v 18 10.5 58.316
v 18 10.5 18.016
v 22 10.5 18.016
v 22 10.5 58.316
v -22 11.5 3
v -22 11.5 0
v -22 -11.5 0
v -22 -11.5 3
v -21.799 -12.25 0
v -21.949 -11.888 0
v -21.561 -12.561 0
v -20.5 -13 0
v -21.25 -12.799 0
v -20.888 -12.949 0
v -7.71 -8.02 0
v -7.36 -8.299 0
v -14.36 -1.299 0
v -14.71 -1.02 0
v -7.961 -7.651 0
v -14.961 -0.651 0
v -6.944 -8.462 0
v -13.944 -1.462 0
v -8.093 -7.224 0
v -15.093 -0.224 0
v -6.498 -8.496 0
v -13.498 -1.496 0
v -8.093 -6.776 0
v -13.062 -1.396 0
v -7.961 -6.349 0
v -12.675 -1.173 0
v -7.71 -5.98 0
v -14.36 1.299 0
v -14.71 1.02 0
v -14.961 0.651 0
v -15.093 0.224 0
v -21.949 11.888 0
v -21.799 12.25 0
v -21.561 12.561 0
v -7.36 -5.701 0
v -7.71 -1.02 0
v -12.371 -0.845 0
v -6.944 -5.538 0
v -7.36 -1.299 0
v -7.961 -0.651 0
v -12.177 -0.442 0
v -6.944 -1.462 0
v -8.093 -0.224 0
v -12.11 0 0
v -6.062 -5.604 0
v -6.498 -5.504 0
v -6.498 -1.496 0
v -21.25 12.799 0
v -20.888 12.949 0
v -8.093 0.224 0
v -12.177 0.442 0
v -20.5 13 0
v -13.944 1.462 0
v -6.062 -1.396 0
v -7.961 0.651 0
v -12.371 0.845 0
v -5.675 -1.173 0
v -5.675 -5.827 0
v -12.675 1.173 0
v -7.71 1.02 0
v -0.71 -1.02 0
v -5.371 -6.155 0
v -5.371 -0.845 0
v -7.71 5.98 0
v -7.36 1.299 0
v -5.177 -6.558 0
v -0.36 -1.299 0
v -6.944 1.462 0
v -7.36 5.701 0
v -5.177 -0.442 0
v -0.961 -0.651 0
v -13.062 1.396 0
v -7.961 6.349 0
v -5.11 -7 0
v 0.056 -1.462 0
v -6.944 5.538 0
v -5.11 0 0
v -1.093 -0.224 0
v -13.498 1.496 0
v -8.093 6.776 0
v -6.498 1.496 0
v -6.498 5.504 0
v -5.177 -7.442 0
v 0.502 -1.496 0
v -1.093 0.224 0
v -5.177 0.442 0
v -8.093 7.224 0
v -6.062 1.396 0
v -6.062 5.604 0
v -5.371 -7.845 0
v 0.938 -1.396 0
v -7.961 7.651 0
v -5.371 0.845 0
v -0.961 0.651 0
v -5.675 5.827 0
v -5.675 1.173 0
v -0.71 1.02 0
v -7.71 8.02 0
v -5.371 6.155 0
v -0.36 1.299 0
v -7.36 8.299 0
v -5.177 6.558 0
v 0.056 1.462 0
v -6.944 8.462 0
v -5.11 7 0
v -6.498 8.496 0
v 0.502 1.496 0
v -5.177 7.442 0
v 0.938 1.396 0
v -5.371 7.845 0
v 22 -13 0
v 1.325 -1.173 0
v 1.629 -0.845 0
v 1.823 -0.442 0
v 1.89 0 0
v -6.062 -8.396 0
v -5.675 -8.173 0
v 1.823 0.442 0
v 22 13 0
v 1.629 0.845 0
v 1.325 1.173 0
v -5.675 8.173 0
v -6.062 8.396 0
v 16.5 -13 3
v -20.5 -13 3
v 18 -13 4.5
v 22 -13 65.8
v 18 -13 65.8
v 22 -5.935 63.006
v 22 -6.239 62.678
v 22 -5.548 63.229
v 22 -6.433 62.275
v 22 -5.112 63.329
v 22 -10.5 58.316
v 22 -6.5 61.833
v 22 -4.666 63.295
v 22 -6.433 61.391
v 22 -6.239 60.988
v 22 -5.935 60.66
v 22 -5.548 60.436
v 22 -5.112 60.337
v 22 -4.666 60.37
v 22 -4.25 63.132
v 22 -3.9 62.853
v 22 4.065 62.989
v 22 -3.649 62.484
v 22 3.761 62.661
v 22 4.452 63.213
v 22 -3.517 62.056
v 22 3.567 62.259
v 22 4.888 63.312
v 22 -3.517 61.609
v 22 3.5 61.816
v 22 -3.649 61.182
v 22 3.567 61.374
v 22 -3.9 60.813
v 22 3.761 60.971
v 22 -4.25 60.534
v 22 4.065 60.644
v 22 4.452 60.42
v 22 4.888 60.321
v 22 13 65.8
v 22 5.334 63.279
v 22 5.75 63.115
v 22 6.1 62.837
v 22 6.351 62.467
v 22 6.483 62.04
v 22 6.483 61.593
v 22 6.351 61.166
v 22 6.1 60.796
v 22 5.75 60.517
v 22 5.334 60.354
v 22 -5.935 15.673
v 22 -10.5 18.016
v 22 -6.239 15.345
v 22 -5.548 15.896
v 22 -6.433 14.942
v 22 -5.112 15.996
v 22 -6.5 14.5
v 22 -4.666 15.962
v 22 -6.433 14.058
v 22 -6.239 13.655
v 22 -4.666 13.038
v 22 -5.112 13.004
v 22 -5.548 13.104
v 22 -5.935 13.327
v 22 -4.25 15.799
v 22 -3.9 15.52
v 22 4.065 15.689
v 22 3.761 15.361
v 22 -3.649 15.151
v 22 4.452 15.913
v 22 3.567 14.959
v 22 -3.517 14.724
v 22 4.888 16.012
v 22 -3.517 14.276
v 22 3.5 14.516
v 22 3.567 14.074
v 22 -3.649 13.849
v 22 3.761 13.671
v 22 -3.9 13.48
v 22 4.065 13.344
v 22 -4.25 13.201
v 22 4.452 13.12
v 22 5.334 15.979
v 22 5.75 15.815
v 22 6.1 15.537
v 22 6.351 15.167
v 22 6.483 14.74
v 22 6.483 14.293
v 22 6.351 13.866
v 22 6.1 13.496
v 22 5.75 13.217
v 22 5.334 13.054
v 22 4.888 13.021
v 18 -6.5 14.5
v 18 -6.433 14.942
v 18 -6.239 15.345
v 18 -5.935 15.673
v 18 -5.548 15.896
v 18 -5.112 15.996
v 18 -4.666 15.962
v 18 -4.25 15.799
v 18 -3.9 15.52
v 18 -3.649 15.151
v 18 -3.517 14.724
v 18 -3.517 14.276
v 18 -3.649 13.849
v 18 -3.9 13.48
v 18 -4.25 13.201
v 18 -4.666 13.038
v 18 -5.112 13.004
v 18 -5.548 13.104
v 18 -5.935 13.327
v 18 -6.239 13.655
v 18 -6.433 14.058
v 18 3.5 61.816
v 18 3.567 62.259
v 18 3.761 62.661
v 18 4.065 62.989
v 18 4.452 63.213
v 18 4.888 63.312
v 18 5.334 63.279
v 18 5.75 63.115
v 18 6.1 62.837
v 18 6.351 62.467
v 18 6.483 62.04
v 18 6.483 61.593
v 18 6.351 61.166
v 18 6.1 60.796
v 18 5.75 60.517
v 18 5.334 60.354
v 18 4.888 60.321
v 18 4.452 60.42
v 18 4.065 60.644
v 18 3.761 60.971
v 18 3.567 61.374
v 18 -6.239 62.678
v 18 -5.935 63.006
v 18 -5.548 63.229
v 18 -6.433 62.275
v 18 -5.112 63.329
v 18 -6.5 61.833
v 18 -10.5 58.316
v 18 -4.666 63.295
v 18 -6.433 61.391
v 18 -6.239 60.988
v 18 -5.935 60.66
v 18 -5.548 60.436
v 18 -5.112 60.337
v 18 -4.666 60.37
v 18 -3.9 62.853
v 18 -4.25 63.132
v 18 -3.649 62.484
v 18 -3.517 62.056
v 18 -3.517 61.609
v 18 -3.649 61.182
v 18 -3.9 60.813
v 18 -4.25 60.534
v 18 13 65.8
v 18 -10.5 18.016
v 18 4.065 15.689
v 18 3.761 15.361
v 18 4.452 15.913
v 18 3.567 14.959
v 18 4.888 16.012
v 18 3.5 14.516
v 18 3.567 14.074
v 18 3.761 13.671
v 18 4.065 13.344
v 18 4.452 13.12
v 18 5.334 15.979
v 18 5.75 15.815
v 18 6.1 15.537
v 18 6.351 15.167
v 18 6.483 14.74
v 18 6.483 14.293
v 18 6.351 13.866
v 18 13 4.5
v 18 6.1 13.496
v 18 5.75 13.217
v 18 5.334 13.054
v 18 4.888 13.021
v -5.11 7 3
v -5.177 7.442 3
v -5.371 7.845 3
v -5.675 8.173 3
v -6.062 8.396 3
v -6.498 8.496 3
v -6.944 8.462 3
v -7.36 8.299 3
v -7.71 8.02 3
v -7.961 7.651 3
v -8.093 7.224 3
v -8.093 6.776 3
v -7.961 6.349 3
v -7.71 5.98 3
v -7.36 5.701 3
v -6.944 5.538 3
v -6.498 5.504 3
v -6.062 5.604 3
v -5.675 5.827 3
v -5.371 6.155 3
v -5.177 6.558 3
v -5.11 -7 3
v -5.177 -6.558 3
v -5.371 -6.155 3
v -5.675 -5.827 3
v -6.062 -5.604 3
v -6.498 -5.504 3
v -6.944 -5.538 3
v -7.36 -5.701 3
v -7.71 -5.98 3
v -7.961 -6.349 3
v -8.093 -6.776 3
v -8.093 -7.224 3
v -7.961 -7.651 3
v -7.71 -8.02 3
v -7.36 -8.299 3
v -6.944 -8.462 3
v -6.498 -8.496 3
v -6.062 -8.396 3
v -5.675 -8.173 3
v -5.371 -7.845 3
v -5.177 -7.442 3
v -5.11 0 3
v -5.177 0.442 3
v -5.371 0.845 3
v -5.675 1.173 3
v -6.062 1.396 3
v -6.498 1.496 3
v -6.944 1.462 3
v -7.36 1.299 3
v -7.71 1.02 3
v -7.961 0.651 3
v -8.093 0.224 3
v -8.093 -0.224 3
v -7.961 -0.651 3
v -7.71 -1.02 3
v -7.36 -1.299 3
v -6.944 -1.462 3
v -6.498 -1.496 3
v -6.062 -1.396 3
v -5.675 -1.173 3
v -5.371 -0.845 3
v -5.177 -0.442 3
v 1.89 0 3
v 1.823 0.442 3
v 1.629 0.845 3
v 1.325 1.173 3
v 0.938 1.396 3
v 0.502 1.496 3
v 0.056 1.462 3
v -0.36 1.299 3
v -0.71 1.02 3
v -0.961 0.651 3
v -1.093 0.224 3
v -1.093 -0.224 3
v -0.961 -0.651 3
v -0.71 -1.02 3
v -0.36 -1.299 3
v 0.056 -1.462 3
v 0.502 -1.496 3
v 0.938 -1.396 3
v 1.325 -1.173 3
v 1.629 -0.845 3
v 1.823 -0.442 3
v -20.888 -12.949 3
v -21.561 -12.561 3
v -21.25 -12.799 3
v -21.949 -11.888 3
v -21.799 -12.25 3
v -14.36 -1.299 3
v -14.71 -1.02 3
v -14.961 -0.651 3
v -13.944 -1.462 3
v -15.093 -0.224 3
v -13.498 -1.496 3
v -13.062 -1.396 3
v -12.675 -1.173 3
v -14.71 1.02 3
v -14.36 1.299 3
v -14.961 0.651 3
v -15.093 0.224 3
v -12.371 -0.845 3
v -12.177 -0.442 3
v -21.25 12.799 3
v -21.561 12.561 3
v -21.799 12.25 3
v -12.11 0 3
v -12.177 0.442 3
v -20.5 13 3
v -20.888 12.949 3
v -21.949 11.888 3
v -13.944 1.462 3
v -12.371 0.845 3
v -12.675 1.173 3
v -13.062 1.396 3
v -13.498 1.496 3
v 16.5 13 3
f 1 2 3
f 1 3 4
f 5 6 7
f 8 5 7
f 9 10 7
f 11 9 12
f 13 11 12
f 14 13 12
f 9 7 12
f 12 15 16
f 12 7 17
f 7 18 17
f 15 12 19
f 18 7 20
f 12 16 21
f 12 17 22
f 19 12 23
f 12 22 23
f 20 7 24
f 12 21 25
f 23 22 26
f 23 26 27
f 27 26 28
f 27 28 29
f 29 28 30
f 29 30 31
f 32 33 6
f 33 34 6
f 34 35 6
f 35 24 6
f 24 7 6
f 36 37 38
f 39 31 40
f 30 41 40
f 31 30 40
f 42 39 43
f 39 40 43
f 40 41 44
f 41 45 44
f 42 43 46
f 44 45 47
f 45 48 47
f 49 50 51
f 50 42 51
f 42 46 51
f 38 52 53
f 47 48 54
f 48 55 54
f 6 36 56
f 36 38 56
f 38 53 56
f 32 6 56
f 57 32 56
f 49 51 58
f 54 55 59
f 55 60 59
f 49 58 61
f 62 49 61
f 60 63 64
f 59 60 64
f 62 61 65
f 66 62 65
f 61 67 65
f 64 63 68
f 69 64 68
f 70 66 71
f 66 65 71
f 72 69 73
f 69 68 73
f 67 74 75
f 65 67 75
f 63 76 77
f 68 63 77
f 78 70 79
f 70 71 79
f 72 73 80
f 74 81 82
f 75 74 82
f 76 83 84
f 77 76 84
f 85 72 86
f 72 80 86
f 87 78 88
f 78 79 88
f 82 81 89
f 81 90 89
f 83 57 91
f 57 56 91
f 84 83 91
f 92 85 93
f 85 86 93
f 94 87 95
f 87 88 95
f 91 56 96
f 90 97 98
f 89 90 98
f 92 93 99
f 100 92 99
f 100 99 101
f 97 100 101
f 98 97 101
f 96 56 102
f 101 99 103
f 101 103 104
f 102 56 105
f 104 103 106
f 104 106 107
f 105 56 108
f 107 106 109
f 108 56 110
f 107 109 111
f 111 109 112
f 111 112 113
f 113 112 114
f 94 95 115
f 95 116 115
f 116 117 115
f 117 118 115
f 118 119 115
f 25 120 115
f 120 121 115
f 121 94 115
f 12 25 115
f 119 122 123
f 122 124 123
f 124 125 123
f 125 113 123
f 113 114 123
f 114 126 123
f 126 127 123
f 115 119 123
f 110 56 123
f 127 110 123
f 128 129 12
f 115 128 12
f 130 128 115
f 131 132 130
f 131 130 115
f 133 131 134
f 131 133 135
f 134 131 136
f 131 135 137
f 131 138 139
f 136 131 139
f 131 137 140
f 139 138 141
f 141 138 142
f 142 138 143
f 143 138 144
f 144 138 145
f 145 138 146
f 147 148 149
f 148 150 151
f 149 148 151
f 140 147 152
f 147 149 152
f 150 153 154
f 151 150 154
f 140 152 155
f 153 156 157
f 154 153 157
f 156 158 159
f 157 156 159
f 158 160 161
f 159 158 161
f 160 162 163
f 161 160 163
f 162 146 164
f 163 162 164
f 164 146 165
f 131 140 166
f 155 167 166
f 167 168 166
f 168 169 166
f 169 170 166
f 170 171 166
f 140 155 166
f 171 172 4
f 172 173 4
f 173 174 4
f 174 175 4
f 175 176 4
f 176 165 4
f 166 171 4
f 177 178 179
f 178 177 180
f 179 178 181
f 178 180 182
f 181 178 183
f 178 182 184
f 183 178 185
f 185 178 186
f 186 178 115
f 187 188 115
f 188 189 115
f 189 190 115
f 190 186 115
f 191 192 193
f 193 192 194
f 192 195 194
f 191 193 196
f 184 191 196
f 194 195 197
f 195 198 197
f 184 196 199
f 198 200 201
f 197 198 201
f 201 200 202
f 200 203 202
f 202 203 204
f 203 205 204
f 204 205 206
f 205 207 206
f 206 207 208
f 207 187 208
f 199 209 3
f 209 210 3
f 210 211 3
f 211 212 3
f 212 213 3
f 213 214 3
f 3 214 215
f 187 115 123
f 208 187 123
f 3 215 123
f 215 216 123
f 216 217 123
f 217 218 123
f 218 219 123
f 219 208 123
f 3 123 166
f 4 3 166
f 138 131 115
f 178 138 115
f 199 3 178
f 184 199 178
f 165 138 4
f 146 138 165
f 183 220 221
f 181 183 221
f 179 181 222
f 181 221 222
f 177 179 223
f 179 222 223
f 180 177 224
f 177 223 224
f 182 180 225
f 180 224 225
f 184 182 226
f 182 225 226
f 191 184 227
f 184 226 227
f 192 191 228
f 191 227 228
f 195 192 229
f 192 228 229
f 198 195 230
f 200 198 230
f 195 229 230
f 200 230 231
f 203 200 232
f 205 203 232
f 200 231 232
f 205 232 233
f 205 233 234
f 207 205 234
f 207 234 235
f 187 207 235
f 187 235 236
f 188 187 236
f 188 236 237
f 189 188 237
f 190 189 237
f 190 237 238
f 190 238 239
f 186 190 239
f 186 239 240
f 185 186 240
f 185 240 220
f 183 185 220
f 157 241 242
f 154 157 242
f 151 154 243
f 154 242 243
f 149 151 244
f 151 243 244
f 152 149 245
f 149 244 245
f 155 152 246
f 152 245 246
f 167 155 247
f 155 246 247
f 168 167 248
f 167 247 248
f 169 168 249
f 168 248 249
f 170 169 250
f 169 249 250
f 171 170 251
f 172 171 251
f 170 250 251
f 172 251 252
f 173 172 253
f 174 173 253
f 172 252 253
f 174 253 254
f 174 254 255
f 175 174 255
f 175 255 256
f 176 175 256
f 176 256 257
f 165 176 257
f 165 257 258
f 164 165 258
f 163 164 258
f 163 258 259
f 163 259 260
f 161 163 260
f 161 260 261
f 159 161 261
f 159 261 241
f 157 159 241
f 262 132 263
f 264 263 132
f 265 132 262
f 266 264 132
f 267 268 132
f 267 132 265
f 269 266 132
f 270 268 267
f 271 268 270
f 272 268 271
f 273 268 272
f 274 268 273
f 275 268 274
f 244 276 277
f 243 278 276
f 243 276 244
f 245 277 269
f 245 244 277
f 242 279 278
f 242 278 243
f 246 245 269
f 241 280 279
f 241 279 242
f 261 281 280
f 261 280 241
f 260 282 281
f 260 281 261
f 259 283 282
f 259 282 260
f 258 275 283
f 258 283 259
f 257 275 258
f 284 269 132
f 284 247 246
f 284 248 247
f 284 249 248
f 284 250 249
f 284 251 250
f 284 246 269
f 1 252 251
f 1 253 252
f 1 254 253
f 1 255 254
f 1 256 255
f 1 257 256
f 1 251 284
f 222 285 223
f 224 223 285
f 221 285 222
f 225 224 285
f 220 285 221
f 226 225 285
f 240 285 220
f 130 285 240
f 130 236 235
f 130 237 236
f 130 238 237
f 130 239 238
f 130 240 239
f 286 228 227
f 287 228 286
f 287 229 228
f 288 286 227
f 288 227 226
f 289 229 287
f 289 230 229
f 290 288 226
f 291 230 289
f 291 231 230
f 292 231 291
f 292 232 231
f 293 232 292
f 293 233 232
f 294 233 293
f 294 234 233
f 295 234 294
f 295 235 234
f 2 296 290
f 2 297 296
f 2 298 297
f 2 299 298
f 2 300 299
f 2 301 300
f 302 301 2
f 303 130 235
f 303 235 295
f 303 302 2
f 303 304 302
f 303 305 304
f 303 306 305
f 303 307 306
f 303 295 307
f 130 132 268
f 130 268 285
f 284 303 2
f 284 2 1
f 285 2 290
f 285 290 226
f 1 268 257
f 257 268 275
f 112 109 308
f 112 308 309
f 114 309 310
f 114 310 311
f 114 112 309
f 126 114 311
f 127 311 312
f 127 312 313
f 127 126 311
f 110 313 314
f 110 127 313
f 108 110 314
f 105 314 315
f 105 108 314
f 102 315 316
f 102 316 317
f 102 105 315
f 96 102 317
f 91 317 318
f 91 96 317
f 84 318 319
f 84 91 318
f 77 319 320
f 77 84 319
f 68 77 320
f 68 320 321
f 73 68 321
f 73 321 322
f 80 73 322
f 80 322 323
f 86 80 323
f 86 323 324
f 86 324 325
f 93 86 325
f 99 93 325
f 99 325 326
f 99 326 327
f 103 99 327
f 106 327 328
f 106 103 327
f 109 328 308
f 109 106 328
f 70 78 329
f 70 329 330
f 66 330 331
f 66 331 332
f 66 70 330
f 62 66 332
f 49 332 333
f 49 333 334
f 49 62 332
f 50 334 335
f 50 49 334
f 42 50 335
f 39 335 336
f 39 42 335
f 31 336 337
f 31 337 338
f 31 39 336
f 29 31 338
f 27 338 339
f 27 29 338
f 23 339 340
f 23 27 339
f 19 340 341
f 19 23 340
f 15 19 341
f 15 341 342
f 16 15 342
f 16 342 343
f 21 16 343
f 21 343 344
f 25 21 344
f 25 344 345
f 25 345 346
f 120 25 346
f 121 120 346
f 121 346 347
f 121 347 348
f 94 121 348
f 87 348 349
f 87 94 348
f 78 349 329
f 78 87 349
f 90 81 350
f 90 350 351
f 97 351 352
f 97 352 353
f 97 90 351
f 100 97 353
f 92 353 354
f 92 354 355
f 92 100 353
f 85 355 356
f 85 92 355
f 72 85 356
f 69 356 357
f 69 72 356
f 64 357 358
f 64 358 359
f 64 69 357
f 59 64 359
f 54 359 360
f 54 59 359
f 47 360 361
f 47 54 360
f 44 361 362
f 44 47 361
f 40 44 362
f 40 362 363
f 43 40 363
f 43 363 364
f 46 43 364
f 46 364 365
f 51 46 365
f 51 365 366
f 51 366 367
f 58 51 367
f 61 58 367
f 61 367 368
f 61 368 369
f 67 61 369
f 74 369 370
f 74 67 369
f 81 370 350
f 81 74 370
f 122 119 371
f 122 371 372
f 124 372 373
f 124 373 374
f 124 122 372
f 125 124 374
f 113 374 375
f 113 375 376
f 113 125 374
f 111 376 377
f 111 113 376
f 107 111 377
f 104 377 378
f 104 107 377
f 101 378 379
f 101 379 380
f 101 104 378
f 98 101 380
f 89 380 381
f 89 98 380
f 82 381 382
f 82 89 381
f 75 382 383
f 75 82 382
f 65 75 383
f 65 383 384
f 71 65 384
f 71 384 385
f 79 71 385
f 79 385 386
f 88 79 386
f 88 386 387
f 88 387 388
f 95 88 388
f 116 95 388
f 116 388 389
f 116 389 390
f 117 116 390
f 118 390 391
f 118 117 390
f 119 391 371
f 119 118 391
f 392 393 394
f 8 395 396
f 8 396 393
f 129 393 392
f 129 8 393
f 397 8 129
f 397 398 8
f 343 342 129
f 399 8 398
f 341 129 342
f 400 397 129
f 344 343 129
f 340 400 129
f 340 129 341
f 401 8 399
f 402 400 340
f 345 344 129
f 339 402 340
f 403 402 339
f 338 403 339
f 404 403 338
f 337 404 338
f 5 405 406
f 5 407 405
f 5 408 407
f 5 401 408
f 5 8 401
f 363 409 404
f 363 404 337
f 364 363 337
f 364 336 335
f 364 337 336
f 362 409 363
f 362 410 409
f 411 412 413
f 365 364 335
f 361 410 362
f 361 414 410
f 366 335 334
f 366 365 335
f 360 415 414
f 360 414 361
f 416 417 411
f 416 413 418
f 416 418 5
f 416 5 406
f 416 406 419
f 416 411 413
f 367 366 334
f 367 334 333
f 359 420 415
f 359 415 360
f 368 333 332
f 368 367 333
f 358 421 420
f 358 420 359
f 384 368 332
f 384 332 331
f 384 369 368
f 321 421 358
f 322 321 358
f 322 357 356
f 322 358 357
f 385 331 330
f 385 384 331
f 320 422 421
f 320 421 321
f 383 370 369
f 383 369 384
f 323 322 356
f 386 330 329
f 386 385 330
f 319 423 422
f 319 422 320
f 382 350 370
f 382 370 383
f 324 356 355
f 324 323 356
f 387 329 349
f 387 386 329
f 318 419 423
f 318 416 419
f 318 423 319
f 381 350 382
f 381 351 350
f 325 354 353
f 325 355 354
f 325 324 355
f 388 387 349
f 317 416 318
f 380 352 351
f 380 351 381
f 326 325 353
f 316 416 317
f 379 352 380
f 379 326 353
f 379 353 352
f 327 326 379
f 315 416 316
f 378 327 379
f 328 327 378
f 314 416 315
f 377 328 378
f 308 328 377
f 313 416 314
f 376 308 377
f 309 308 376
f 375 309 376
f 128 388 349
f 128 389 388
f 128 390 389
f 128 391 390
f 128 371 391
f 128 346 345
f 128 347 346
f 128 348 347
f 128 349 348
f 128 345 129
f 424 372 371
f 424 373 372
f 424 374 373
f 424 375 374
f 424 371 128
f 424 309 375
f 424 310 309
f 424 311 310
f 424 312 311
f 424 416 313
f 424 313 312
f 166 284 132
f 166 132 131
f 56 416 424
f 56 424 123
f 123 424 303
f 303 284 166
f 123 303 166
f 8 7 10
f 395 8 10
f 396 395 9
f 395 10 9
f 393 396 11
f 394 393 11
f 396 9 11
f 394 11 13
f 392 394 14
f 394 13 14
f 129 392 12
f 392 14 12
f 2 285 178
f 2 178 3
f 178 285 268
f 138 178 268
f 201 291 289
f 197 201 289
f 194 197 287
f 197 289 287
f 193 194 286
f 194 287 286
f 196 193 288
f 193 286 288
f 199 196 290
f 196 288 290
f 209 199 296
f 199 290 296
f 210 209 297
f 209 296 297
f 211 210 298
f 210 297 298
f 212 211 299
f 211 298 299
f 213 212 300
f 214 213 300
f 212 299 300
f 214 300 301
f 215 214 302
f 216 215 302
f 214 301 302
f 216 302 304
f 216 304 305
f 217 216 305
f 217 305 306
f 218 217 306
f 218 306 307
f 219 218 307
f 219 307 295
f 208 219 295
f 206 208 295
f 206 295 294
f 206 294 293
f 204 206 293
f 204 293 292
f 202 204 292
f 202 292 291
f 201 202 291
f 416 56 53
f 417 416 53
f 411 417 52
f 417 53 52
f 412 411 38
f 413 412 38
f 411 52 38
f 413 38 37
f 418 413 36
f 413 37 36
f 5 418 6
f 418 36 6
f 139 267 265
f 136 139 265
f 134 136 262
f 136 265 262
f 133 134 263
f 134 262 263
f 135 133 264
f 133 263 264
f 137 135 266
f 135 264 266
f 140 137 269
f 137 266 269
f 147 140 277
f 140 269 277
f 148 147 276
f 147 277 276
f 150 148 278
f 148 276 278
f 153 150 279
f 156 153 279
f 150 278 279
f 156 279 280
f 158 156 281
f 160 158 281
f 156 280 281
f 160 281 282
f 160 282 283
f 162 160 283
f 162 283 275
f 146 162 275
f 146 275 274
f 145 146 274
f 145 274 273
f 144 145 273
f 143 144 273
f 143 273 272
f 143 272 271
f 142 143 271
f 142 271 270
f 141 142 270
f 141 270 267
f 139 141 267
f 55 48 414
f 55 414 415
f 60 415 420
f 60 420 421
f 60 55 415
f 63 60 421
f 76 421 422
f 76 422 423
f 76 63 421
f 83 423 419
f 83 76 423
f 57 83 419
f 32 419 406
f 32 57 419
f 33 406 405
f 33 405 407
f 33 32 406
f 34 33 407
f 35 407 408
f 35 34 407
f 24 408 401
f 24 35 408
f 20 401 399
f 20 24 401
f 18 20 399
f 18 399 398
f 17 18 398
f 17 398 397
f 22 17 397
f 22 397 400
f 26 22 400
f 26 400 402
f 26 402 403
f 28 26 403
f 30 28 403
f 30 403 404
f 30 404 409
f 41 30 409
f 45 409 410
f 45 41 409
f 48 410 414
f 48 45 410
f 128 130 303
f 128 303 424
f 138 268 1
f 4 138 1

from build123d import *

# Parameters (mm, degrees)
CROQUIS1_R              = 1.5
SALIENTE_EXTRUIR1_DEPTH = 3
CROQUIS2_W              = 4
CROQUIS2_H              = 26
SALIENTE_EXTRUIR2_DEPTH = 62.8
SALIENTE_EXTRUIR3_DEPTH = 26
CROQUIS5_W              = 40.3
CROQUIS5_H              = 21
CROQUIS5_R              = 1.5
CORTAR_EXTRUIR1_DEPTH   = 26


with BuildPart() as part:
    # Croquis1 → Saliente-Extruir1 (new body)
    with BuildSketch(Plane.XY):
        with BuildLine():
            Line((-20.5, -13), (22, -13))
            Line((22, -13), (22, 13))
            Line((22, 13), (-20.5, 13))
            ThreePointArc((-20.5, 13), (-21.560660172, 12.560660172), (-22, 11.5))
            Line((-22, 11.5), (-22, -11.5))
            ThreePointArc((-22, -11.5), (-21.560660172, -12.560660172), (-20.5, -13))
        make_face()
        with Locations((-6.61, 0)):
            Circle(CROQUIS1_R, mode=Mode.SUBTRACT)
        with Locations((-13.61, 0)):
            Circle(CROQUIS1_R, mode=Mode.SUBTRACT)
        with Locations((-6.61, 7)):
            Circle(CROQUIS1_R, mode=Mode.SUBTRACT)
        with Locations((0.39, 0)):
            Circle(CROQUIS1_R, mode=Mode.SUBTRACT)
        with Locations((-6.61, -7)):
            Circle(CROQUIS1_R, mode=Mode.SUBTRACT)
    extrude(amount=SALIENTE_EXTRUIR1_DEPTH)

    # Croquis2 → Saliente-Extruir2 (add)
    with BuildSketch(Plane.XY.offset(3)):
        with Locations((20, 0)):
            Rectangle(CROQUIS2_W, CROQUIS2_H)
    extrude(amount=SALIENTE_EXTRUIR2_DEPTH)

    # Croquis3 → Saliente-Extruir3 (add)
    with BuildSketch(Plane.XZ.offset(13)):
        Polygon((18, 3), (18, 4.5), (16.5, 3), align=None)
    extrude(amount=-SALIENTE_EXTRUIR3_DEPTH)

    # Croquis5 → Cortar-Extruir1 (cut)
    with BuildSketch(Plane.ZY.offset(-18)):
        with Locations((38.1664, 0)):
            Rectangle(CROQUIS5_W, CROQUIS5_H)
        with Locations(Location((14.5, -5, 0), (0, 0, 270))):
            Circle(CROQUIS5_R)
        with Locations(Location((14.5164, 5, 0), (0, 0, 270))):
            Circle(CROQUIS5_R)
        with Locations(Location((61.8164, 5, 0), (0, 0, 270))):
            Circle(CROQUIS5_R)
        with Locations(Location((61.8328, -5, 0), (0, 0, 270))):
            Circle(CROQUIS5_R)
    extrude(amount=-CORTAR_EXTRUIR1_DEPTH, mode=Mode.SUBTRACT)


solid = part.part
